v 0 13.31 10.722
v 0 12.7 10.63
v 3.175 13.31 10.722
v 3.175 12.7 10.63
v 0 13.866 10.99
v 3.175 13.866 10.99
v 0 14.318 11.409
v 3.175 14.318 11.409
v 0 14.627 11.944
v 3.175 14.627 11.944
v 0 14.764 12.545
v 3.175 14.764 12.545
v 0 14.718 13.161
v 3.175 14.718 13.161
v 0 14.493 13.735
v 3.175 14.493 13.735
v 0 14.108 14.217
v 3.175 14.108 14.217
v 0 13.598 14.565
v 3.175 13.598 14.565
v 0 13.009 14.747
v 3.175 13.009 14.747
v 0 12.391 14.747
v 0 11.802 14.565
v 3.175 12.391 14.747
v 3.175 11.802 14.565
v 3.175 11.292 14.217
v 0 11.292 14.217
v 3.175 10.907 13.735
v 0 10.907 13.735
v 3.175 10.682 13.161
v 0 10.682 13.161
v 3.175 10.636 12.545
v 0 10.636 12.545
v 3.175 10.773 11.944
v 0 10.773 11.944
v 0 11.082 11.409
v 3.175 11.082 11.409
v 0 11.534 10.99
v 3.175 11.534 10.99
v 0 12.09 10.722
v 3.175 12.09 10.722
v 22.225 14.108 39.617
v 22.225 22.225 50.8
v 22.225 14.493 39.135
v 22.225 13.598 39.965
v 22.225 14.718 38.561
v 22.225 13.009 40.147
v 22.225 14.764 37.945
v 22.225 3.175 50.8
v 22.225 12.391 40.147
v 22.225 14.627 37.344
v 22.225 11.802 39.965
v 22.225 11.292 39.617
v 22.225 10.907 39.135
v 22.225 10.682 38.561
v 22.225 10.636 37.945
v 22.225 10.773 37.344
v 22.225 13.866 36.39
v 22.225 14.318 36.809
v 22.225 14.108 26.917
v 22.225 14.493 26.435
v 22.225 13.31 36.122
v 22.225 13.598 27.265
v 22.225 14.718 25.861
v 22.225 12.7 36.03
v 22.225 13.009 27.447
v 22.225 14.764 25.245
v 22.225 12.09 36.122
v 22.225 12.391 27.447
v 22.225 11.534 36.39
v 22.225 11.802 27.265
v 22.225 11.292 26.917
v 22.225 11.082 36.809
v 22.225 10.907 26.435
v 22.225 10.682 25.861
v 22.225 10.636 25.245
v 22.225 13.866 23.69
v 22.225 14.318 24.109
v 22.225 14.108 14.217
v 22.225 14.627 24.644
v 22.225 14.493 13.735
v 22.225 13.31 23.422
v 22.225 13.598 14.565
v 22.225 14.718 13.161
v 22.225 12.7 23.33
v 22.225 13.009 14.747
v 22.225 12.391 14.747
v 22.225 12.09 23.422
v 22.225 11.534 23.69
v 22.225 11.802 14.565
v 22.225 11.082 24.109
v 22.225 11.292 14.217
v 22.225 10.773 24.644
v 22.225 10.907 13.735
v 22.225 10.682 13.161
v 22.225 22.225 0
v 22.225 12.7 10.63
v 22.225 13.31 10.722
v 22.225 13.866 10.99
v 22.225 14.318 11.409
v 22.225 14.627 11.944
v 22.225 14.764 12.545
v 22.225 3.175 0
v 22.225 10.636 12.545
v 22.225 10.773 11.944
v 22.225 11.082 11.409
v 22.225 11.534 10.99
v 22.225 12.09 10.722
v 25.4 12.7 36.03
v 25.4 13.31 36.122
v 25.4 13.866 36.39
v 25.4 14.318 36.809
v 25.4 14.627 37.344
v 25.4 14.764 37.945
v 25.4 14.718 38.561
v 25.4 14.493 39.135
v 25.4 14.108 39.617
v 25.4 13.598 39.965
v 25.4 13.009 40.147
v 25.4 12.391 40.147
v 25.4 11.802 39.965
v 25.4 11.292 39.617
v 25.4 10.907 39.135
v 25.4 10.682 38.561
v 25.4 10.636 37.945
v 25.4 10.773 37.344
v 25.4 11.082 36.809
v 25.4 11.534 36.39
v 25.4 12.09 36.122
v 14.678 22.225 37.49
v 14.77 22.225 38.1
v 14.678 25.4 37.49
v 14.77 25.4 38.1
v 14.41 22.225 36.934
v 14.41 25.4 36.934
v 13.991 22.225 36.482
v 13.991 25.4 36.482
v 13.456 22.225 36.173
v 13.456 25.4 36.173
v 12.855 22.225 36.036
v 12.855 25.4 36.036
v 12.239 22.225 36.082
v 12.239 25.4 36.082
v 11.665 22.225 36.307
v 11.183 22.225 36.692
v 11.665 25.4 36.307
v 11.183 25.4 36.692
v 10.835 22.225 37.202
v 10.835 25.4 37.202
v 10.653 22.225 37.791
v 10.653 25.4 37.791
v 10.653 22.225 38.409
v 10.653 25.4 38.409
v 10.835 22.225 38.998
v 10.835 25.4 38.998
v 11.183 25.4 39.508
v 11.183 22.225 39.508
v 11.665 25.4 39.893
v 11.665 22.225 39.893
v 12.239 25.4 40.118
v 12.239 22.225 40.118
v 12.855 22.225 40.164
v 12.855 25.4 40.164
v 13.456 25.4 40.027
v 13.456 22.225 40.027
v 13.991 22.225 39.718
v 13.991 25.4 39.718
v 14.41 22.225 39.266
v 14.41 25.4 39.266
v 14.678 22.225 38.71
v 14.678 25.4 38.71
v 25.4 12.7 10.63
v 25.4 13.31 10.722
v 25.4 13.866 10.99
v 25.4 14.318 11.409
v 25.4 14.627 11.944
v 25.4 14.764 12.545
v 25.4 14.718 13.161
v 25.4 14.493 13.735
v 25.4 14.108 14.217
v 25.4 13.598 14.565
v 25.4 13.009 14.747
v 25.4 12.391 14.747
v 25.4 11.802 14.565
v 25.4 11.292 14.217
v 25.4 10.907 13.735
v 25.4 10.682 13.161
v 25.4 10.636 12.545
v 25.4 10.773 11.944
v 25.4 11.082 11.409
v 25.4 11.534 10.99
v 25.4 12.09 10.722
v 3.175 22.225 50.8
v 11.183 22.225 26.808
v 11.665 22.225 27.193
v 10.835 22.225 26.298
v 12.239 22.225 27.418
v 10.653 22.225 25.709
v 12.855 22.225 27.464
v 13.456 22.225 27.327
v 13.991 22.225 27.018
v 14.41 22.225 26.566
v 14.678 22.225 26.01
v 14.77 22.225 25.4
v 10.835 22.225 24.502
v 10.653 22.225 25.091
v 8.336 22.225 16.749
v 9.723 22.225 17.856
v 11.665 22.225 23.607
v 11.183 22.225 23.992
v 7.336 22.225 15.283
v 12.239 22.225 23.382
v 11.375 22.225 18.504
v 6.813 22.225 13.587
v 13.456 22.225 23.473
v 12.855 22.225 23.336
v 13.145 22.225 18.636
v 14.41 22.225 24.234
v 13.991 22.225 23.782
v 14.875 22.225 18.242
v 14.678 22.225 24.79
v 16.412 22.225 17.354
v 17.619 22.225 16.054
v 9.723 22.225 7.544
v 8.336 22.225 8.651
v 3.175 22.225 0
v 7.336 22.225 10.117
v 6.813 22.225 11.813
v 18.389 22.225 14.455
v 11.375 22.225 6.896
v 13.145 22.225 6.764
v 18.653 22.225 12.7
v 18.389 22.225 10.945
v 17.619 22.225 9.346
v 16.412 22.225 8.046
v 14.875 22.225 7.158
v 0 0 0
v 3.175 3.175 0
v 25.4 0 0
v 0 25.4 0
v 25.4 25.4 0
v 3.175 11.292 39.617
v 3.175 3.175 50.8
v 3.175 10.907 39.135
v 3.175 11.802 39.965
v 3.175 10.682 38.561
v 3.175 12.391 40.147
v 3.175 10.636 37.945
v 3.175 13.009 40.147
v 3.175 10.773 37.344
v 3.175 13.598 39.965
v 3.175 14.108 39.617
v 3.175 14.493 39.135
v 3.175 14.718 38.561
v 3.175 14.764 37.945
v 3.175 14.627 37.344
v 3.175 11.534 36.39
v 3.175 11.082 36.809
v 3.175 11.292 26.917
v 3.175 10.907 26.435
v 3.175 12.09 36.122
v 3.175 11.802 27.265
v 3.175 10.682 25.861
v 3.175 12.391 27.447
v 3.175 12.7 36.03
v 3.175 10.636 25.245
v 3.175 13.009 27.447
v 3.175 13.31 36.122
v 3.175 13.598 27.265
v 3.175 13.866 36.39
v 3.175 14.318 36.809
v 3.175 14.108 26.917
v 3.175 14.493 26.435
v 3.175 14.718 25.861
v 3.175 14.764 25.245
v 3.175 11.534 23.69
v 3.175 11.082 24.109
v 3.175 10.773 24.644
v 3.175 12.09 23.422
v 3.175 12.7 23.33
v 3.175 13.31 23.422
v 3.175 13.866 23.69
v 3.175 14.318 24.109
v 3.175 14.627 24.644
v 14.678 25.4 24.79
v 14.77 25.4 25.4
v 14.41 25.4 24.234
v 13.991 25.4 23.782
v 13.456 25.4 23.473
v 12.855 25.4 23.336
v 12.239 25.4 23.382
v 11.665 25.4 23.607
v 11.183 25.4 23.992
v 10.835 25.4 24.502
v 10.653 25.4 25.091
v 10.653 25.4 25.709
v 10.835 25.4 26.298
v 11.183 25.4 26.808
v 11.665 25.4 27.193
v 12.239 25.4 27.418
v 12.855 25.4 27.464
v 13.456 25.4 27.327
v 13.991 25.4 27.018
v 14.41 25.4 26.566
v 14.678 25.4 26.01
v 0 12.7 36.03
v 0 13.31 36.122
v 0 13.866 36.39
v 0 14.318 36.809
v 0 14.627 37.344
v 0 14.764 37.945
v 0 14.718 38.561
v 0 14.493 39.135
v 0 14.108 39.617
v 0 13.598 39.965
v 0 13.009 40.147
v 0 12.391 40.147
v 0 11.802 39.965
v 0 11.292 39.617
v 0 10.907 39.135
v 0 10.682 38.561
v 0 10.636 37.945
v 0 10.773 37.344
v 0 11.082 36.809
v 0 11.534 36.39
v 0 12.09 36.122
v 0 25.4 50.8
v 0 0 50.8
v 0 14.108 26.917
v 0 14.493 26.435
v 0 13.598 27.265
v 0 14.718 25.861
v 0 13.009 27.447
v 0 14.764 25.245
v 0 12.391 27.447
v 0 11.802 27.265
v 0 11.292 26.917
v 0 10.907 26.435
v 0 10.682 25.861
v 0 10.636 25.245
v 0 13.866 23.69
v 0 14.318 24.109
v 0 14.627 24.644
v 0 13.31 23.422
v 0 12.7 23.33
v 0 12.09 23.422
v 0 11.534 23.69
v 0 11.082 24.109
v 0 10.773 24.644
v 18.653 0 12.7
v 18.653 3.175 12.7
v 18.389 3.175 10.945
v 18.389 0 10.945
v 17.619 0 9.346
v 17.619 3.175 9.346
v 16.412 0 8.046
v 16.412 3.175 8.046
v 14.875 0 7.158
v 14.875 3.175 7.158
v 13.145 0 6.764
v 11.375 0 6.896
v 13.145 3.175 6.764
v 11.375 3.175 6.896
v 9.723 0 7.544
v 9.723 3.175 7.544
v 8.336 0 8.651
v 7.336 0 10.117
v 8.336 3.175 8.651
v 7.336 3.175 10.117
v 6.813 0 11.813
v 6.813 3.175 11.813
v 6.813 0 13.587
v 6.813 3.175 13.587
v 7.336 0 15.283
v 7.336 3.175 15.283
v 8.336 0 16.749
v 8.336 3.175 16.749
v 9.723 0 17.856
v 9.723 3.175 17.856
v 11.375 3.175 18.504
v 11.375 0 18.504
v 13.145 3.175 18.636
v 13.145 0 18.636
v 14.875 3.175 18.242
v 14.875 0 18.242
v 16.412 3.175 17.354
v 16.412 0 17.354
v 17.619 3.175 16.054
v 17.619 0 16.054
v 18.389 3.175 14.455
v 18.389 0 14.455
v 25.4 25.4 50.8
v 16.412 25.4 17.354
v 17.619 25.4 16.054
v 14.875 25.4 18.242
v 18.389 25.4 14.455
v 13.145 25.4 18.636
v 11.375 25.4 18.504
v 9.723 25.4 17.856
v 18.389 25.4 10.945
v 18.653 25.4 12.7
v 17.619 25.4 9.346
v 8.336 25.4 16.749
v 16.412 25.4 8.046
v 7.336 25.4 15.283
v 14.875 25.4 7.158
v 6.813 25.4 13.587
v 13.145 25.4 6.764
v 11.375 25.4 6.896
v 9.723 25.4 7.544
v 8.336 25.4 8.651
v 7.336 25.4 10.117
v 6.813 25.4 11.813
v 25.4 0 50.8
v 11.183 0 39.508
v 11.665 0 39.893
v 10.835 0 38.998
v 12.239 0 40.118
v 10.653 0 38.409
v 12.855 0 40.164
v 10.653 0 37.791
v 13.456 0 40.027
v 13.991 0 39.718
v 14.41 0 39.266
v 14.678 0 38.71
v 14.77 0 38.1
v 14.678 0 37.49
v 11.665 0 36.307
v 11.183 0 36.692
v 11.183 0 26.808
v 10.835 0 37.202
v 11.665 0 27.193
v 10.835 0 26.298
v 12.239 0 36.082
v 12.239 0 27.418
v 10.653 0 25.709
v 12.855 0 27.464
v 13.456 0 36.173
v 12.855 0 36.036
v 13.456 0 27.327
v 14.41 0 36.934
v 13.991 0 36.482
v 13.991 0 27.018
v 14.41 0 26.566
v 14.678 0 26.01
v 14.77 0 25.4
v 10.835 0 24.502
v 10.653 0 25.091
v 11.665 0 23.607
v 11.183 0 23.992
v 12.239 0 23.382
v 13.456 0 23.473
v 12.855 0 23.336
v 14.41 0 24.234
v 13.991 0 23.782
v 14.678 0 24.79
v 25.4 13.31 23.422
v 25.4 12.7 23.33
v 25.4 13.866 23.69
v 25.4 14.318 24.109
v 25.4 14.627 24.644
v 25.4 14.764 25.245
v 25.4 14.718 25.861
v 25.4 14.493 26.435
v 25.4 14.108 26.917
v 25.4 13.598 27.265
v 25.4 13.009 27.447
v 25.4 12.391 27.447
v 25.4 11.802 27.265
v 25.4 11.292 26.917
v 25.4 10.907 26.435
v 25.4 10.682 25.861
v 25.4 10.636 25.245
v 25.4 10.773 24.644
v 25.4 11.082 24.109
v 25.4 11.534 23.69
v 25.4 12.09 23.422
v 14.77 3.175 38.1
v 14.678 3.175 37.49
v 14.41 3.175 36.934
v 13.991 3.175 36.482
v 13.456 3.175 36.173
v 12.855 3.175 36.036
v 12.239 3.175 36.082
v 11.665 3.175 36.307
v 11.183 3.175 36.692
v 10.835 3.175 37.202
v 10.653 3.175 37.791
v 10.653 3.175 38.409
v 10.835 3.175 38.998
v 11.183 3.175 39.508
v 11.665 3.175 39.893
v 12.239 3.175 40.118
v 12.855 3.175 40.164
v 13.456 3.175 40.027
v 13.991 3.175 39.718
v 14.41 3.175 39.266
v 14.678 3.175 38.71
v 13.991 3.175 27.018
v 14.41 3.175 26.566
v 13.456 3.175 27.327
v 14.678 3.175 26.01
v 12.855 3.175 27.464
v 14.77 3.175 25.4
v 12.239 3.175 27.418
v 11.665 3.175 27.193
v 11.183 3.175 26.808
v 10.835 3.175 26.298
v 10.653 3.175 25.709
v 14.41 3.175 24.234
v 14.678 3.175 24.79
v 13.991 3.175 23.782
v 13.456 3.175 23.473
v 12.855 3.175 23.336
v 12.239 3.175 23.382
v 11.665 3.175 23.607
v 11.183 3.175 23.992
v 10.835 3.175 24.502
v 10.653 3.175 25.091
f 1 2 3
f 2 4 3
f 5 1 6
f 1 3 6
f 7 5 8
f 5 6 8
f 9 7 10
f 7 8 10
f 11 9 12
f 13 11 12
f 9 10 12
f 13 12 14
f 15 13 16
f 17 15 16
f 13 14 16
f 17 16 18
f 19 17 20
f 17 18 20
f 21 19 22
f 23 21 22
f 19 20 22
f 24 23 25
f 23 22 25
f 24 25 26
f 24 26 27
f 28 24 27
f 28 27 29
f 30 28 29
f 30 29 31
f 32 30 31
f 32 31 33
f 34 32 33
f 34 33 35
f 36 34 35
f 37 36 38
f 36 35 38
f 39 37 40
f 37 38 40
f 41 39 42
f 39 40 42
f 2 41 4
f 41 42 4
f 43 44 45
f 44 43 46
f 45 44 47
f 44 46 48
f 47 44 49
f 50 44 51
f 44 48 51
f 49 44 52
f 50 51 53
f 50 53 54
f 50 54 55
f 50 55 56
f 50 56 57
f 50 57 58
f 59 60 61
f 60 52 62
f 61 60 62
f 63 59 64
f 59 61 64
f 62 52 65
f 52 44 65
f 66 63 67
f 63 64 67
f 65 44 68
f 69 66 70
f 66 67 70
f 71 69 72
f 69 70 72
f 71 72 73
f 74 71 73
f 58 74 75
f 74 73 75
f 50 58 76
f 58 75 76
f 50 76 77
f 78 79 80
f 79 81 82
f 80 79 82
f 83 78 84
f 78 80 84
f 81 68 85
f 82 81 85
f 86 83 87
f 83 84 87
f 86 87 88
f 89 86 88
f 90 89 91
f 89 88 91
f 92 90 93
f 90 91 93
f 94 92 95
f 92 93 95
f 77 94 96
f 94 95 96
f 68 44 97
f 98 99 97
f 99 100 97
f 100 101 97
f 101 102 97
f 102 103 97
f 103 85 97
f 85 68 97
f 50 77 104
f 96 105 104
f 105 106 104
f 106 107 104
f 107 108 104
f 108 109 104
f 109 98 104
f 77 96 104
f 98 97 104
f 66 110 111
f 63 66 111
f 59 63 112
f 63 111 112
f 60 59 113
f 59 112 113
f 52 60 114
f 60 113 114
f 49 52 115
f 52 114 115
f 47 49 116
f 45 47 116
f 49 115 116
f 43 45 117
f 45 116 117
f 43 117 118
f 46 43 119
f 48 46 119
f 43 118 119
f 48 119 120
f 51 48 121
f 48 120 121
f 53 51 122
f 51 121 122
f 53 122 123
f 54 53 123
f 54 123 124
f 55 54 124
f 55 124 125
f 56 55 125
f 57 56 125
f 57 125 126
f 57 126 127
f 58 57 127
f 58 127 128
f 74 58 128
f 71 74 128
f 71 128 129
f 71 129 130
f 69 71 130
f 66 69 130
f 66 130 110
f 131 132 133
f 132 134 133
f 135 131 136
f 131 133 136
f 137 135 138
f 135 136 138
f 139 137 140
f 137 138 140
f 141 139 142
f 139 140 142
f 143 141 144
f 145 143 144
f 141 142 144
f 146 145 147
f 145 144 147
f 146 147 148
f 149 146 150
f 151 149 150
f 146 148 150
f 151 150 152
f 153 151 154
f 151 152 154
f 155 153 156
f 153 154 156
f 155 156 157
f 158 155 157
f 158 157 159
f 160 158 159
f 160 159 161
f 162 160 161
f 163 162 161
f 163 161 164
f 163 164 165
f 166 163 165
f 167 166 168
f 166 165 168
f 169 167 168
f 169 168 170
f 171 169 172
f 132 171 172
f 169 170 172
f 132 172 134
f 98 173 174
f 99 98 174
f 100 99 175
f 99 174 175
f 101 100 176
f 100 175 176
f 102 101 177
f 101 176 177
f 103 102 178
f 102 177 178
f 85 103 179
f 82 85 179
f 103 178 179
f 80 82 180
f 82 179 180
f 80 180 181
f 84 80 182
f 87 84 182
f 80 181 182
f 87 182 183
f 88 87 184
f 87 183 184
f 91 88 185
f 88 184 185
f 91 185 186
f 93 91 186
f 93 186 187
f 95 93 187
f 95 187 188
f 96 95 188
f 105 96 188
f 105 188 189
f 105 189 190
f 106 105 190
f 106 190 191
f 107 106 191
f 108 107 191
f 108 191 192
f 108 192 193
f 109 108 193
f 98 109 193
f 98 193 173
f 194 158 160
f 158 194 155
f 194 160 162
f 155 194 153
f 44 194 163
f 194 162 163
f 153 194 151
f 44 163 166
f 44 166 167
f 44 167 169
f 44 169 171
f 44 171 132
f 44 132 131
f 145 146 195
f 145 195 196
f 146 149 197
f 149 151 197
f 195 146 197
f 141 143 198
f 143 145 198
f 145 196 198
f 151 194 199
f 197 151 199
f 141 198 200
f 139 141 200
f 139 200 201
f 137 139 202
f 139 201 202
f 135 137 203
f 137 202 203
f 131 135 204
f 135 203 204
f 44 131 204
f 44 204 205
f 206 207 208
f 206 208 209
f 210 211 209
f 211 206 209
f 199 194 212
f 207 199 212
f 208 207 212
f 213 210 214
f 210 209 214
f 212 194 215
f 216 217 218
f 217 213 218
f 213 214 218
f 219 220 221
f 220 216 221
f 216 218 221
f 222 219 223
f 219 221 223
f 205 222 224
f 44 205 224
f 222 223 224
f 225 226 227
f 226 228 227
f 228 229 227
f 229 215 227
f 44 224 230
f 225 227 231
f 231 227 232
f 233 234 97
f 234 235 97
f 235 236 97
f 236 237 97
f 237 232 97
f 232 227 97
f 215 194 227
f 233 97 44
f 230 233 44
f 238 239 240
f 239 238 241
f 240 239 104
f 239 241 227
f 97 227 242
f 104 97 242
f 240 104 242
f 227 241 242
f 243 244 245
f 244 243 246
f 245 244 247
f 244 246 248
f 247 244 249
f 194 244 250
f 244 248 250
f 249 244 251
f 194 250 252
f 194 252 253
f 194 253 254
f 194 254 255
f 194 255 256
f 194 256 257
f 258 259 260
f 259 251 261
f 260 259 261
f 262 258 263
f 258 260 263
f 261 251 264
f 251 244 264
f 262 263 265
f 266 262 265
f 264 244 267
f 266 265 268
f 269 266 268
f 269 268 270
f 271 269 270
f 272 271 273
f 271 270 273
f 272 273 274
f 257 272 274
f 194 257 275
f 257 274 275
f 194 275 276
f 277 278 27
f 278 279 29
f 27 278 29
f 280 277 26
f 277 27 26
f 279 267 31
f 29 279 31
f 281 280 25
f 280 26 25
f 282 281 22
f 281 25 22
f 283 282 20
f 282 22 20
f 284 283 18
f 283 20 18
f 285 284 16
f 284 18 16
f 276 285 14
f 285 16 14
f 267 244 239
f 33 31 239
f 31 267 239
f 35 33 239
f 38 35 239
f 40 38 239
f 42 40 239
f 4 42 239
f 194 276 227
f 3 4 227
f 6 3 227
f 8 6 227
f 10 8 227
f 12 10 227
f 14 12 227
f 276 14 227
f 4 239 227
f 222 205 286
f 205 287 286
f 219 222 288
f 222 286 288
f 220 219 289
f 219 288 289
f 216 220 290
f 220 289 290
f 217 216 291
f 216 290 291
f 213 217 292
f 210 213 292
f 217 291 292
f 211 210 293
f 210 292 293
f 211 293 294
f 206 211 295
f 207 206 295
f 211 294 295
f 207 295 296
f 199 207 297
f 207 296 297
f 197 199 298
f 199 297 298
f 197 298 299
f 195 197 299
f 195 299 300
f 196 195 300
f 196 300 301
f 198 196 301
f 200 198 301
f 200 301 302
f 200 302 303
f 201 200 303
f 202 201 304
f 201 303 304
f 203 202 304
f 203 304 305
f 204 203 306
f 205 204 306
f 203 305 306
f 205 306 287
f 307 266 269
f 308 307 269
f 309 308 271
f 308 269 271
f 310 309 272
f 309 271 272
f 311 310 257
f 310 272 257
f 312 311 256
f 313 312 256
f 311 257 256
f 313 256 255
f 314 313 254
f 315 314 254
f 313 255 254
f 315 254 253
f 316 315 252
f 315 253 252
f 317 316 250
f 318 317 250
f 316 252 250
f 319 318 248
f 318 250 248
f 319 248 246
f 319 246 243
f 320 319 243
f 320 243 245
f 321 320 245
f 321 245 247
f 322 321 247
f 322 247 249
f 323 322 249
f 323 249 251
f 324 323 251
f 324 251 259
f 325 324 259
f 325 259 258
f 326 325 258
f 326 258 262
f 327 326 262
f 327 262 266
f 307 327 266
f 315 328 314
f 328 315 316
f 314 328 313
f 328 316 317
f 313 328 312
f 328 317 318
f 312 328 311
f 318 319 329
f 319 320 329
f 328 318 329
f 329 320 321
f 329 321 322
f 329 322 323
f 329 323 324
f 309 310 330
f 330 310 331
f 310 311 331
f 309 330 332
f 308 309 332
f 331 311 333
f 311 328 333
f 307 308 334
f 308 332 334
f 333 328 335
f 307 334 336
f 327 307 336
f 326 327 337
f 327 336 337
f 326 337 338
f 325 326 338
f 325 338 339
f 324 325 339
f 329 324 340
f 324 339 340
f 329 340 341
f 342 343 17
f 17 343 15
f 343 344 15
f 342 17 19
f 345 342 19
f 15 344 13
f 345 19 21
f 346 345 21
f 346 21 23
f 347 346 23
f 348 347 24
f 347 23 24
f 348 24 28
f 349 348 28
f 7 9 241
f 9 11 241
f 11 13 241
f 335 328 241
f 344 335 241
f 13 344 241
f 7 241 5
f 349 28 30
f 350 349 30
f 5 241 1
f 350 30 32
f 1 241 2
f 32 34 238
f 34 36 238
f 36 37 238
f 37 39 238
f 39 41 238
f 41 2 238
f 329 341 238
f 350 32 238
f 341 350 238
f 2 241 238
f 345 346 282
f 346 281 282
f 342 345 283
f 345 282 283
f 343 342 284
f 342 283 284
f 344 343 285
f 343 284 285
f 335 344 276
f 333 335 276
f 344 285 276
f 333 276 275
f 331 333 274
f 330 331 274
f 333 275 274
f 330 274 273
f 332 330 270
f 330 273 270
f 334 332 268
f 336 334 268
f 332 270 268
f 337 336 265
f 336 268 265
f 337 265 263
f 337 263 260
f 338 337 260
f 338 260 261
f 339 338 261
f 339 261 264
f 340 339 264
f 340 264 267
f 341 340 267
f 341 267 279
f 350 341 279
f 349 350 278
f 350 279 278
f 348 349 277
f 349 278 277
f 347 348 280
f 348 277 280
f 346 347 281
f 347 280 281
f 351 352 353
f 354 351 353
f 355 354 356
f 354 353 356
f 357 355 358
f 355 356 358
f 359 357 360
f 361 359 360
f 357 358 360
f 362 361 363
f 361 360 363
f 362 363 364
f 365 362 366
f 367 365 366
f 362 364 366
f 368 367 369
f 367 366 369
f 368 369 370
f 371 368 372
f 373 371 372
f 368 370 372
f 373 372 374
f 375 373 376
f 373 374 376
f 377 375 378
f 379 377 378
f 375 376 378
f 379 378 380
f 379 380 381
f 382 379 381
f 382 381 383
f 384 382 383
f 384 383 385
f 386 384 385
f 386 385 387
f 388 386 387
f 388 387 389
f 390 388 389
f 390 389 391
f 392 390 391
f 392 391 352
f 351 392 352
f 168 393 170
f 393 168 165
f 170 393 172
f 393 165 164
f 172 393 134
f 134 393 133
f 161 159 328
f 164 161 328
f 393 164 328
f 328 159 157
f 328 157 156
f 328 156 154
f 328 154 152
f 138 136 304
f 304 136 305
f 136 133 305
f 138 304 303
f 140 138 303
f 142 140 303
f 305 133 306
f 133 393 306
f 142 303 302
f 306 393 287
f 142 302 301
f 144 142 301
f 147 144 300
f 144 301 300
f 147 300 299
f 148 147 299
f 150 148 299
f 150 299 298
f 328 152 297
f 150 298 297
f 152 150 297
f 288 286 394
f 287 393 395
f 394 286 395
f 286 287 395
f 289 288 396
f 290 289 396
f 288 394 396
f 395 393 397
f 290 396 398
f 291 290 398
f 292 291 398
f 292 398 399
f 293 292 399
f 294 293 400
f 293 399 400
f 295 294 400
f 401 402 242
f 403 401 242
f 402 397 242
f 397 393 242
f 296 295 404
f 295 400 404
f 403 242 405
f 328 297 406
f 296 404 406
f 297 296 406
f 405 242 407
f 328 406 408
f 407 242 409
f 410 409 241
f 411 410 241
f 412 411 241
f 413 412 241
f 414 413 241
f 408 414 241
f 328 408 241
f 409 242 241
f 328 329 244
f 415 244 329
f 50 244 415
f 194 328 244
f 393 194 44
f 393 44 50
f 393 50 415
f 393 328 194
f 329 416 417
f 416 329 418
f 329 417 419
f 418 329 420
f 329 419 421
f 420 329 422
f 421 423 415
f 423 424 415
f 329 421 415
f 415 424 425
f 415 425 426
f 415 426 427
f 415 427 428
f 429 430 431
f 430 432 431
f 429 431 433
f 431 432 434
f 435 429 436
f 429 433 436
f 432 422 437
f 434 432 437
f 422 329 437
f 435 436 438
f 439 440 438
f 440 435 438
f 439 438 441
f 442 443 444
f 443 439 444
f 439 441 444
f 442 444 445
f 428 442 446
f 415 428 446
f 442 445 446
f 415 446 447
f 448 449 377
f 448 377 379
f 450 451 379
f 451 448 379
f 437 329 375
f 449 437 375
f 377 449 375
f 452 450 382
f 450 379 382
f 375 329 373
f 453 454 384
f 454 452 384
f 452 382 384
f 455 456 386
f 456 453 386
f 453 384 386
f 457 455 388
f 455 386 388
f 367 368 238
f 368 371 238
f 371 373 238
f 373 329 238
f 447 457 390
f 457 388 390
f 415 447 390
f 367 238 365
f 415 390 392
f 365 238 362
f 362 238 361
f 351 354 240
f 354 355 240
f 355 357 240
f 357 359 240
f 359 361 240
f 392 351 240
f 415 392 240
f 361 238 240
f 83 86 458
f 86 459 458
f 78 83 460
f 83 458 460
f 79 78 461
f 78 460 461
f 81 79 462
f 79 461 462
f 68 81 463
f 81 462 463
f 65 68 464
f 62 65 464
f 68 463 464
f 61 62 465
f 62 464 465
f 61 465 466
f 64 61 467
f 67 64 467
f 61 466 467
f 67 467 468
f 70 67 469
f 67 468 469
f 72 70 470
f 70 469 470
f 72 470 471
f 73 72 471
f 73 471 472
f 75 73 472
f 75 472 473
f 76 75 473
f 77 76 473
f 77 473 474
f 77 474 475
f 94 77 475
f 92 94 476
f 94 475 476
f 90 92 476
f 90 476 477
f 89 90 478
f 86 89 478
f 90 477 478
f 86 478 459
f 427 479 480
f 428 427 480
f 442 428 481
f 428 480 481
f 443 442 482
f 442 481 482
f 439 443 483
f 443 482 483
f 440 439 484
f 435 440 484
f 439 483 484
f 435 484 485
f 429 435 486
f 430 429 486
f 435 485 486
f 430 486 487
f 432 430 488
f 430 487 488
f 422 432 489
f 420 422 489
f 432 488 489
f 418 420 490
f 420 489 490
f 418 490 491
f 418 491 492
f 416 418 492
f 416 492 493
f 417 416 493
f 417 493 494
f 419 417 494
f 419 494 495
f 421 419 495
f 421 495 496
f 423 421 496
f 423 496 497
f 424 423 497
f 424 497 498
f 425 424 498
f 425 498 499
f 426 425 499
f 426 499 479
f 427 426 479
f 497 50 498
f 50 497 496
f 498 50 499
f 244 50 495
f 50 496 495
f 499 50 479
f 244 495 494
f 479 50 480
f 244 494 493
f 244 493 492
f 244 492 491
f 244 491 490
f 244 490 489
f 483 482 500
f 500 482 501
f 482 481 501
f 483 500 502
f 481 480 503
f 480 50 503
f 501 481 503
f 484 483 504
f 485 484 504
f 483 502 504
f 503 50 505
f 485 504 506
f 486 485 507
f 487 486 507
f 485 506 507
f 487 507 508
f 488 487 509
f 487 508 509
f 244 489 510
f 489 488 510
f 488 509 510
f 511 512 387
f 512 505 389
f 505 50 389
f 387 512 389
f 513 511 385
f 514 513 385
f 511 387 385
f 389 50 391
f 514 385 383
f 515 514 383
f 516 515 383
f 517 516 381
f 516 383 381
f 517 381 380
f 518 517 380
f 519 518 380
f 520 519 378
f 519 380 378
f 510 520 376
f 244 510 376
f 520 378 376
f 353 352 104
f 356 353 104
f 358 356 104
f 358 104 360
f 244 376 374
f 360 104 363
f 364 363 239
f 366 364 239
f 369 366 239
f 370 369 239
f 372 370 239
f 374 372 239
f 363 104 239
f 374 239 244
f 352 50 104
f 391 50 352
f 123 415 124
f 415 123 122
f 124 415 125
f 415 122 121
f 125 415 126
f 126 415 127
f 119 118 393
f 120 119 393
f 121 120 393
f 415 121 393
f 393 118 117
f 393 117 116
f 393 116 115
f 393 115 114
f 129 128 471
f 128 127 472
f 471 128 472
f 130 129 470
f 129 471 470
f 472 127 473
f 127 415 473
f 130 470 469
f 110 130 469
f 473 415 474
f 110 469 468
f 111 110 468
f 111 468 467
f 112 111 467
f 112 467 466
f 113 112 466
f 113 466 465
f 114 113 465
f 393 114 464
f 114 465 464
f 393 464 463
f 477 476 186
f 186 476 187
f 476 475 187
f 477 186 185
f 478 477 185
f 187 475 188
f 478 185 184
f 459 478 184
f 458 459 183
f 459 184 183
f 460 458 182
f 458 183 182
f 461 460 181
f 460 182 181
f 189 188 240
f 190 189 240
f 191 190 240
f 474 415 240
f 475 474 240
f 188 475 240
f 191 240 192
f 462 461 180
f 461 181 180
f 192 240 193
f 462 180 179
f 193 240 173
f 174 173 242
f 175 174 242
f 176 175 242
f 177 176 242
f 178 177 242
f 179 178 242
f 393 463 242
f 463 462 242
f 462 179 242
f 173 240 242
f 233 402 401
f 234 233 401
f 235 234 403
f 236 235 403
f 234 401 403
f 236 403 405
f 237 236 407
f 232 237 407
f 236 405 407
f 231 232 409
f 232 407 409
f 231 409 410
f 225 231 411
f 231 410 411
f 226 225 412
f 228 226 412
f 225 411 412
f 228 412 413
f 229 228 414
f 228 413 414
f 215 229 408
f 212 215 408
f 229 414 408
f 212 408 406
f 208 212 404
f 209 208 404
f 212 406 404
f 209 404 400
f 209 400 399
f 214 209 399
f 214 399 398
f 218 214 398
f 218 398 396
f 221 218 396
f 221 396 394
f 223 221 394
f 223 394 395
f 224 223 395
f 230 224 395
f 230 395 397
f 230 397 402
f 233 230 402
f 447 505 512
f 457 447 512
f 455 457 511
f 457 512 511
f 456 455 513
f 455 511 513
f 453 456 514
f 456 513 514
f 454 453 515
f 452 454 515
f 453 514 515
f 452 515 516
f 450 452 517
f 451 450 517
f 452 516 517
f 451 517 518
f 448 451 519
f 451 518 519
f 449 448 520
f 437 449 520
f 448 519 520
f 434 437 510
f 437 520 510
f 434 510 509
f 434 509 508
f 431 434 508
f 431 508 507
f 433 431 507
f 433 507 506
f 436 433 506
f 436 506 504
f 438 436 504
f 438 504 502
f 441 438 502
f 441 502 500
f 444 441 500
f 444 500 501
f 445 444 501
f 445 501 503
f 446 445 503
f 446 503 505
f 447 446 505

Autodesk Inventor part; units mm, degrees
ref_plane "YZ Plane" through (0, 0, 0) normal (1, 0, 0) x (0, 1, 0)
ref_plane "XZ Plane" through (0, 0, 0) normal (0, 1, 0) x (-1, 0, 0)
ref_plane "XY Plane" through (0, 0, 0) normal (0, 0, 1) x (1, 0, 0)
sketch "Sketch1" plane through (0, 0, 0) normal (0, 0, 1) x (1, 0, 0)
  line L0 (0, 0) -> (25.4, 0)
  line L1 (25.4, 0) -> (25.4, 25.4)
  line L2 (25.4, 25.4) -> (0, 25.4)
  line L3 (0, 25.4) -> (0, 0)
  line L4 (3.175, 22.225) -> (22.225, 22.225)
  line L5 (22.225, 22.225) -> (22.225, 3.175)
  line L6 (22.225, 3.175) -> (3.175, 3.175)
  line L7 (3.175, 3.175) -> (3.175, 22.225)
  dimension "d0" = 25.4
  dimension "d1" = 25.4
  dimension "d2" = 3.175
extrude "Extrusion1" add sketch "Sketch1" along normal blind 50.8
sketch "Sketch2" plane through (25.4, 0, 0) normal (1, 0, 0) x (0, 0, -1)
  line L0 (-50.8, 0) -> (-50.8, 25.4) projected
  line L1 (0, 0) -> (-50.8, 0) projected
  circle A0 centre (-38.1, 12.7) radius 2.0701
  circle A1 centre (-25.4, 12.7) radius 2.0701
  circle A2 centre (-12.7, 12.7) radius 2.0701
  dimension "d5" = 4.1402
  dimension "d6" = 12.7
  dimension "d7" = 12.7
  dimension "d10" = 12.7
extrude "Extrusion2" cut sketch "Sketch2" against normal blind 50.8
sketch "Sketch3" plane through (0, 25.4, 0) normal (0, 1, 0) x (1, 0, 0)
  line L0 (25.4, -50.8) -> (0, -50.8) projected
  line L1 (25.4, 0) -> (25.4, -50.8) projected
  circle A0 centre (12.7, -38.1) radius 2.0701
  circle A1 centre (12.7, -25.4) radius 2.0701
  circle A2 centre (12.7, -12.7) radius 5.9531
  dimension "d17" = 4.1402
  dimension "d18" = 12.7
  dimension "d19" = 12.7
  dimension "d22" = 12.7
  dimension "d27" = 11.9062
  dimension "d28" = 12.7
  dimension "d29" = 12.7
extrude "Extrusion3" cut sketch "Sketch3" against normal blind 50.8
properties part number "2 in 3-8 in Hex Shaft Holders (4)"
